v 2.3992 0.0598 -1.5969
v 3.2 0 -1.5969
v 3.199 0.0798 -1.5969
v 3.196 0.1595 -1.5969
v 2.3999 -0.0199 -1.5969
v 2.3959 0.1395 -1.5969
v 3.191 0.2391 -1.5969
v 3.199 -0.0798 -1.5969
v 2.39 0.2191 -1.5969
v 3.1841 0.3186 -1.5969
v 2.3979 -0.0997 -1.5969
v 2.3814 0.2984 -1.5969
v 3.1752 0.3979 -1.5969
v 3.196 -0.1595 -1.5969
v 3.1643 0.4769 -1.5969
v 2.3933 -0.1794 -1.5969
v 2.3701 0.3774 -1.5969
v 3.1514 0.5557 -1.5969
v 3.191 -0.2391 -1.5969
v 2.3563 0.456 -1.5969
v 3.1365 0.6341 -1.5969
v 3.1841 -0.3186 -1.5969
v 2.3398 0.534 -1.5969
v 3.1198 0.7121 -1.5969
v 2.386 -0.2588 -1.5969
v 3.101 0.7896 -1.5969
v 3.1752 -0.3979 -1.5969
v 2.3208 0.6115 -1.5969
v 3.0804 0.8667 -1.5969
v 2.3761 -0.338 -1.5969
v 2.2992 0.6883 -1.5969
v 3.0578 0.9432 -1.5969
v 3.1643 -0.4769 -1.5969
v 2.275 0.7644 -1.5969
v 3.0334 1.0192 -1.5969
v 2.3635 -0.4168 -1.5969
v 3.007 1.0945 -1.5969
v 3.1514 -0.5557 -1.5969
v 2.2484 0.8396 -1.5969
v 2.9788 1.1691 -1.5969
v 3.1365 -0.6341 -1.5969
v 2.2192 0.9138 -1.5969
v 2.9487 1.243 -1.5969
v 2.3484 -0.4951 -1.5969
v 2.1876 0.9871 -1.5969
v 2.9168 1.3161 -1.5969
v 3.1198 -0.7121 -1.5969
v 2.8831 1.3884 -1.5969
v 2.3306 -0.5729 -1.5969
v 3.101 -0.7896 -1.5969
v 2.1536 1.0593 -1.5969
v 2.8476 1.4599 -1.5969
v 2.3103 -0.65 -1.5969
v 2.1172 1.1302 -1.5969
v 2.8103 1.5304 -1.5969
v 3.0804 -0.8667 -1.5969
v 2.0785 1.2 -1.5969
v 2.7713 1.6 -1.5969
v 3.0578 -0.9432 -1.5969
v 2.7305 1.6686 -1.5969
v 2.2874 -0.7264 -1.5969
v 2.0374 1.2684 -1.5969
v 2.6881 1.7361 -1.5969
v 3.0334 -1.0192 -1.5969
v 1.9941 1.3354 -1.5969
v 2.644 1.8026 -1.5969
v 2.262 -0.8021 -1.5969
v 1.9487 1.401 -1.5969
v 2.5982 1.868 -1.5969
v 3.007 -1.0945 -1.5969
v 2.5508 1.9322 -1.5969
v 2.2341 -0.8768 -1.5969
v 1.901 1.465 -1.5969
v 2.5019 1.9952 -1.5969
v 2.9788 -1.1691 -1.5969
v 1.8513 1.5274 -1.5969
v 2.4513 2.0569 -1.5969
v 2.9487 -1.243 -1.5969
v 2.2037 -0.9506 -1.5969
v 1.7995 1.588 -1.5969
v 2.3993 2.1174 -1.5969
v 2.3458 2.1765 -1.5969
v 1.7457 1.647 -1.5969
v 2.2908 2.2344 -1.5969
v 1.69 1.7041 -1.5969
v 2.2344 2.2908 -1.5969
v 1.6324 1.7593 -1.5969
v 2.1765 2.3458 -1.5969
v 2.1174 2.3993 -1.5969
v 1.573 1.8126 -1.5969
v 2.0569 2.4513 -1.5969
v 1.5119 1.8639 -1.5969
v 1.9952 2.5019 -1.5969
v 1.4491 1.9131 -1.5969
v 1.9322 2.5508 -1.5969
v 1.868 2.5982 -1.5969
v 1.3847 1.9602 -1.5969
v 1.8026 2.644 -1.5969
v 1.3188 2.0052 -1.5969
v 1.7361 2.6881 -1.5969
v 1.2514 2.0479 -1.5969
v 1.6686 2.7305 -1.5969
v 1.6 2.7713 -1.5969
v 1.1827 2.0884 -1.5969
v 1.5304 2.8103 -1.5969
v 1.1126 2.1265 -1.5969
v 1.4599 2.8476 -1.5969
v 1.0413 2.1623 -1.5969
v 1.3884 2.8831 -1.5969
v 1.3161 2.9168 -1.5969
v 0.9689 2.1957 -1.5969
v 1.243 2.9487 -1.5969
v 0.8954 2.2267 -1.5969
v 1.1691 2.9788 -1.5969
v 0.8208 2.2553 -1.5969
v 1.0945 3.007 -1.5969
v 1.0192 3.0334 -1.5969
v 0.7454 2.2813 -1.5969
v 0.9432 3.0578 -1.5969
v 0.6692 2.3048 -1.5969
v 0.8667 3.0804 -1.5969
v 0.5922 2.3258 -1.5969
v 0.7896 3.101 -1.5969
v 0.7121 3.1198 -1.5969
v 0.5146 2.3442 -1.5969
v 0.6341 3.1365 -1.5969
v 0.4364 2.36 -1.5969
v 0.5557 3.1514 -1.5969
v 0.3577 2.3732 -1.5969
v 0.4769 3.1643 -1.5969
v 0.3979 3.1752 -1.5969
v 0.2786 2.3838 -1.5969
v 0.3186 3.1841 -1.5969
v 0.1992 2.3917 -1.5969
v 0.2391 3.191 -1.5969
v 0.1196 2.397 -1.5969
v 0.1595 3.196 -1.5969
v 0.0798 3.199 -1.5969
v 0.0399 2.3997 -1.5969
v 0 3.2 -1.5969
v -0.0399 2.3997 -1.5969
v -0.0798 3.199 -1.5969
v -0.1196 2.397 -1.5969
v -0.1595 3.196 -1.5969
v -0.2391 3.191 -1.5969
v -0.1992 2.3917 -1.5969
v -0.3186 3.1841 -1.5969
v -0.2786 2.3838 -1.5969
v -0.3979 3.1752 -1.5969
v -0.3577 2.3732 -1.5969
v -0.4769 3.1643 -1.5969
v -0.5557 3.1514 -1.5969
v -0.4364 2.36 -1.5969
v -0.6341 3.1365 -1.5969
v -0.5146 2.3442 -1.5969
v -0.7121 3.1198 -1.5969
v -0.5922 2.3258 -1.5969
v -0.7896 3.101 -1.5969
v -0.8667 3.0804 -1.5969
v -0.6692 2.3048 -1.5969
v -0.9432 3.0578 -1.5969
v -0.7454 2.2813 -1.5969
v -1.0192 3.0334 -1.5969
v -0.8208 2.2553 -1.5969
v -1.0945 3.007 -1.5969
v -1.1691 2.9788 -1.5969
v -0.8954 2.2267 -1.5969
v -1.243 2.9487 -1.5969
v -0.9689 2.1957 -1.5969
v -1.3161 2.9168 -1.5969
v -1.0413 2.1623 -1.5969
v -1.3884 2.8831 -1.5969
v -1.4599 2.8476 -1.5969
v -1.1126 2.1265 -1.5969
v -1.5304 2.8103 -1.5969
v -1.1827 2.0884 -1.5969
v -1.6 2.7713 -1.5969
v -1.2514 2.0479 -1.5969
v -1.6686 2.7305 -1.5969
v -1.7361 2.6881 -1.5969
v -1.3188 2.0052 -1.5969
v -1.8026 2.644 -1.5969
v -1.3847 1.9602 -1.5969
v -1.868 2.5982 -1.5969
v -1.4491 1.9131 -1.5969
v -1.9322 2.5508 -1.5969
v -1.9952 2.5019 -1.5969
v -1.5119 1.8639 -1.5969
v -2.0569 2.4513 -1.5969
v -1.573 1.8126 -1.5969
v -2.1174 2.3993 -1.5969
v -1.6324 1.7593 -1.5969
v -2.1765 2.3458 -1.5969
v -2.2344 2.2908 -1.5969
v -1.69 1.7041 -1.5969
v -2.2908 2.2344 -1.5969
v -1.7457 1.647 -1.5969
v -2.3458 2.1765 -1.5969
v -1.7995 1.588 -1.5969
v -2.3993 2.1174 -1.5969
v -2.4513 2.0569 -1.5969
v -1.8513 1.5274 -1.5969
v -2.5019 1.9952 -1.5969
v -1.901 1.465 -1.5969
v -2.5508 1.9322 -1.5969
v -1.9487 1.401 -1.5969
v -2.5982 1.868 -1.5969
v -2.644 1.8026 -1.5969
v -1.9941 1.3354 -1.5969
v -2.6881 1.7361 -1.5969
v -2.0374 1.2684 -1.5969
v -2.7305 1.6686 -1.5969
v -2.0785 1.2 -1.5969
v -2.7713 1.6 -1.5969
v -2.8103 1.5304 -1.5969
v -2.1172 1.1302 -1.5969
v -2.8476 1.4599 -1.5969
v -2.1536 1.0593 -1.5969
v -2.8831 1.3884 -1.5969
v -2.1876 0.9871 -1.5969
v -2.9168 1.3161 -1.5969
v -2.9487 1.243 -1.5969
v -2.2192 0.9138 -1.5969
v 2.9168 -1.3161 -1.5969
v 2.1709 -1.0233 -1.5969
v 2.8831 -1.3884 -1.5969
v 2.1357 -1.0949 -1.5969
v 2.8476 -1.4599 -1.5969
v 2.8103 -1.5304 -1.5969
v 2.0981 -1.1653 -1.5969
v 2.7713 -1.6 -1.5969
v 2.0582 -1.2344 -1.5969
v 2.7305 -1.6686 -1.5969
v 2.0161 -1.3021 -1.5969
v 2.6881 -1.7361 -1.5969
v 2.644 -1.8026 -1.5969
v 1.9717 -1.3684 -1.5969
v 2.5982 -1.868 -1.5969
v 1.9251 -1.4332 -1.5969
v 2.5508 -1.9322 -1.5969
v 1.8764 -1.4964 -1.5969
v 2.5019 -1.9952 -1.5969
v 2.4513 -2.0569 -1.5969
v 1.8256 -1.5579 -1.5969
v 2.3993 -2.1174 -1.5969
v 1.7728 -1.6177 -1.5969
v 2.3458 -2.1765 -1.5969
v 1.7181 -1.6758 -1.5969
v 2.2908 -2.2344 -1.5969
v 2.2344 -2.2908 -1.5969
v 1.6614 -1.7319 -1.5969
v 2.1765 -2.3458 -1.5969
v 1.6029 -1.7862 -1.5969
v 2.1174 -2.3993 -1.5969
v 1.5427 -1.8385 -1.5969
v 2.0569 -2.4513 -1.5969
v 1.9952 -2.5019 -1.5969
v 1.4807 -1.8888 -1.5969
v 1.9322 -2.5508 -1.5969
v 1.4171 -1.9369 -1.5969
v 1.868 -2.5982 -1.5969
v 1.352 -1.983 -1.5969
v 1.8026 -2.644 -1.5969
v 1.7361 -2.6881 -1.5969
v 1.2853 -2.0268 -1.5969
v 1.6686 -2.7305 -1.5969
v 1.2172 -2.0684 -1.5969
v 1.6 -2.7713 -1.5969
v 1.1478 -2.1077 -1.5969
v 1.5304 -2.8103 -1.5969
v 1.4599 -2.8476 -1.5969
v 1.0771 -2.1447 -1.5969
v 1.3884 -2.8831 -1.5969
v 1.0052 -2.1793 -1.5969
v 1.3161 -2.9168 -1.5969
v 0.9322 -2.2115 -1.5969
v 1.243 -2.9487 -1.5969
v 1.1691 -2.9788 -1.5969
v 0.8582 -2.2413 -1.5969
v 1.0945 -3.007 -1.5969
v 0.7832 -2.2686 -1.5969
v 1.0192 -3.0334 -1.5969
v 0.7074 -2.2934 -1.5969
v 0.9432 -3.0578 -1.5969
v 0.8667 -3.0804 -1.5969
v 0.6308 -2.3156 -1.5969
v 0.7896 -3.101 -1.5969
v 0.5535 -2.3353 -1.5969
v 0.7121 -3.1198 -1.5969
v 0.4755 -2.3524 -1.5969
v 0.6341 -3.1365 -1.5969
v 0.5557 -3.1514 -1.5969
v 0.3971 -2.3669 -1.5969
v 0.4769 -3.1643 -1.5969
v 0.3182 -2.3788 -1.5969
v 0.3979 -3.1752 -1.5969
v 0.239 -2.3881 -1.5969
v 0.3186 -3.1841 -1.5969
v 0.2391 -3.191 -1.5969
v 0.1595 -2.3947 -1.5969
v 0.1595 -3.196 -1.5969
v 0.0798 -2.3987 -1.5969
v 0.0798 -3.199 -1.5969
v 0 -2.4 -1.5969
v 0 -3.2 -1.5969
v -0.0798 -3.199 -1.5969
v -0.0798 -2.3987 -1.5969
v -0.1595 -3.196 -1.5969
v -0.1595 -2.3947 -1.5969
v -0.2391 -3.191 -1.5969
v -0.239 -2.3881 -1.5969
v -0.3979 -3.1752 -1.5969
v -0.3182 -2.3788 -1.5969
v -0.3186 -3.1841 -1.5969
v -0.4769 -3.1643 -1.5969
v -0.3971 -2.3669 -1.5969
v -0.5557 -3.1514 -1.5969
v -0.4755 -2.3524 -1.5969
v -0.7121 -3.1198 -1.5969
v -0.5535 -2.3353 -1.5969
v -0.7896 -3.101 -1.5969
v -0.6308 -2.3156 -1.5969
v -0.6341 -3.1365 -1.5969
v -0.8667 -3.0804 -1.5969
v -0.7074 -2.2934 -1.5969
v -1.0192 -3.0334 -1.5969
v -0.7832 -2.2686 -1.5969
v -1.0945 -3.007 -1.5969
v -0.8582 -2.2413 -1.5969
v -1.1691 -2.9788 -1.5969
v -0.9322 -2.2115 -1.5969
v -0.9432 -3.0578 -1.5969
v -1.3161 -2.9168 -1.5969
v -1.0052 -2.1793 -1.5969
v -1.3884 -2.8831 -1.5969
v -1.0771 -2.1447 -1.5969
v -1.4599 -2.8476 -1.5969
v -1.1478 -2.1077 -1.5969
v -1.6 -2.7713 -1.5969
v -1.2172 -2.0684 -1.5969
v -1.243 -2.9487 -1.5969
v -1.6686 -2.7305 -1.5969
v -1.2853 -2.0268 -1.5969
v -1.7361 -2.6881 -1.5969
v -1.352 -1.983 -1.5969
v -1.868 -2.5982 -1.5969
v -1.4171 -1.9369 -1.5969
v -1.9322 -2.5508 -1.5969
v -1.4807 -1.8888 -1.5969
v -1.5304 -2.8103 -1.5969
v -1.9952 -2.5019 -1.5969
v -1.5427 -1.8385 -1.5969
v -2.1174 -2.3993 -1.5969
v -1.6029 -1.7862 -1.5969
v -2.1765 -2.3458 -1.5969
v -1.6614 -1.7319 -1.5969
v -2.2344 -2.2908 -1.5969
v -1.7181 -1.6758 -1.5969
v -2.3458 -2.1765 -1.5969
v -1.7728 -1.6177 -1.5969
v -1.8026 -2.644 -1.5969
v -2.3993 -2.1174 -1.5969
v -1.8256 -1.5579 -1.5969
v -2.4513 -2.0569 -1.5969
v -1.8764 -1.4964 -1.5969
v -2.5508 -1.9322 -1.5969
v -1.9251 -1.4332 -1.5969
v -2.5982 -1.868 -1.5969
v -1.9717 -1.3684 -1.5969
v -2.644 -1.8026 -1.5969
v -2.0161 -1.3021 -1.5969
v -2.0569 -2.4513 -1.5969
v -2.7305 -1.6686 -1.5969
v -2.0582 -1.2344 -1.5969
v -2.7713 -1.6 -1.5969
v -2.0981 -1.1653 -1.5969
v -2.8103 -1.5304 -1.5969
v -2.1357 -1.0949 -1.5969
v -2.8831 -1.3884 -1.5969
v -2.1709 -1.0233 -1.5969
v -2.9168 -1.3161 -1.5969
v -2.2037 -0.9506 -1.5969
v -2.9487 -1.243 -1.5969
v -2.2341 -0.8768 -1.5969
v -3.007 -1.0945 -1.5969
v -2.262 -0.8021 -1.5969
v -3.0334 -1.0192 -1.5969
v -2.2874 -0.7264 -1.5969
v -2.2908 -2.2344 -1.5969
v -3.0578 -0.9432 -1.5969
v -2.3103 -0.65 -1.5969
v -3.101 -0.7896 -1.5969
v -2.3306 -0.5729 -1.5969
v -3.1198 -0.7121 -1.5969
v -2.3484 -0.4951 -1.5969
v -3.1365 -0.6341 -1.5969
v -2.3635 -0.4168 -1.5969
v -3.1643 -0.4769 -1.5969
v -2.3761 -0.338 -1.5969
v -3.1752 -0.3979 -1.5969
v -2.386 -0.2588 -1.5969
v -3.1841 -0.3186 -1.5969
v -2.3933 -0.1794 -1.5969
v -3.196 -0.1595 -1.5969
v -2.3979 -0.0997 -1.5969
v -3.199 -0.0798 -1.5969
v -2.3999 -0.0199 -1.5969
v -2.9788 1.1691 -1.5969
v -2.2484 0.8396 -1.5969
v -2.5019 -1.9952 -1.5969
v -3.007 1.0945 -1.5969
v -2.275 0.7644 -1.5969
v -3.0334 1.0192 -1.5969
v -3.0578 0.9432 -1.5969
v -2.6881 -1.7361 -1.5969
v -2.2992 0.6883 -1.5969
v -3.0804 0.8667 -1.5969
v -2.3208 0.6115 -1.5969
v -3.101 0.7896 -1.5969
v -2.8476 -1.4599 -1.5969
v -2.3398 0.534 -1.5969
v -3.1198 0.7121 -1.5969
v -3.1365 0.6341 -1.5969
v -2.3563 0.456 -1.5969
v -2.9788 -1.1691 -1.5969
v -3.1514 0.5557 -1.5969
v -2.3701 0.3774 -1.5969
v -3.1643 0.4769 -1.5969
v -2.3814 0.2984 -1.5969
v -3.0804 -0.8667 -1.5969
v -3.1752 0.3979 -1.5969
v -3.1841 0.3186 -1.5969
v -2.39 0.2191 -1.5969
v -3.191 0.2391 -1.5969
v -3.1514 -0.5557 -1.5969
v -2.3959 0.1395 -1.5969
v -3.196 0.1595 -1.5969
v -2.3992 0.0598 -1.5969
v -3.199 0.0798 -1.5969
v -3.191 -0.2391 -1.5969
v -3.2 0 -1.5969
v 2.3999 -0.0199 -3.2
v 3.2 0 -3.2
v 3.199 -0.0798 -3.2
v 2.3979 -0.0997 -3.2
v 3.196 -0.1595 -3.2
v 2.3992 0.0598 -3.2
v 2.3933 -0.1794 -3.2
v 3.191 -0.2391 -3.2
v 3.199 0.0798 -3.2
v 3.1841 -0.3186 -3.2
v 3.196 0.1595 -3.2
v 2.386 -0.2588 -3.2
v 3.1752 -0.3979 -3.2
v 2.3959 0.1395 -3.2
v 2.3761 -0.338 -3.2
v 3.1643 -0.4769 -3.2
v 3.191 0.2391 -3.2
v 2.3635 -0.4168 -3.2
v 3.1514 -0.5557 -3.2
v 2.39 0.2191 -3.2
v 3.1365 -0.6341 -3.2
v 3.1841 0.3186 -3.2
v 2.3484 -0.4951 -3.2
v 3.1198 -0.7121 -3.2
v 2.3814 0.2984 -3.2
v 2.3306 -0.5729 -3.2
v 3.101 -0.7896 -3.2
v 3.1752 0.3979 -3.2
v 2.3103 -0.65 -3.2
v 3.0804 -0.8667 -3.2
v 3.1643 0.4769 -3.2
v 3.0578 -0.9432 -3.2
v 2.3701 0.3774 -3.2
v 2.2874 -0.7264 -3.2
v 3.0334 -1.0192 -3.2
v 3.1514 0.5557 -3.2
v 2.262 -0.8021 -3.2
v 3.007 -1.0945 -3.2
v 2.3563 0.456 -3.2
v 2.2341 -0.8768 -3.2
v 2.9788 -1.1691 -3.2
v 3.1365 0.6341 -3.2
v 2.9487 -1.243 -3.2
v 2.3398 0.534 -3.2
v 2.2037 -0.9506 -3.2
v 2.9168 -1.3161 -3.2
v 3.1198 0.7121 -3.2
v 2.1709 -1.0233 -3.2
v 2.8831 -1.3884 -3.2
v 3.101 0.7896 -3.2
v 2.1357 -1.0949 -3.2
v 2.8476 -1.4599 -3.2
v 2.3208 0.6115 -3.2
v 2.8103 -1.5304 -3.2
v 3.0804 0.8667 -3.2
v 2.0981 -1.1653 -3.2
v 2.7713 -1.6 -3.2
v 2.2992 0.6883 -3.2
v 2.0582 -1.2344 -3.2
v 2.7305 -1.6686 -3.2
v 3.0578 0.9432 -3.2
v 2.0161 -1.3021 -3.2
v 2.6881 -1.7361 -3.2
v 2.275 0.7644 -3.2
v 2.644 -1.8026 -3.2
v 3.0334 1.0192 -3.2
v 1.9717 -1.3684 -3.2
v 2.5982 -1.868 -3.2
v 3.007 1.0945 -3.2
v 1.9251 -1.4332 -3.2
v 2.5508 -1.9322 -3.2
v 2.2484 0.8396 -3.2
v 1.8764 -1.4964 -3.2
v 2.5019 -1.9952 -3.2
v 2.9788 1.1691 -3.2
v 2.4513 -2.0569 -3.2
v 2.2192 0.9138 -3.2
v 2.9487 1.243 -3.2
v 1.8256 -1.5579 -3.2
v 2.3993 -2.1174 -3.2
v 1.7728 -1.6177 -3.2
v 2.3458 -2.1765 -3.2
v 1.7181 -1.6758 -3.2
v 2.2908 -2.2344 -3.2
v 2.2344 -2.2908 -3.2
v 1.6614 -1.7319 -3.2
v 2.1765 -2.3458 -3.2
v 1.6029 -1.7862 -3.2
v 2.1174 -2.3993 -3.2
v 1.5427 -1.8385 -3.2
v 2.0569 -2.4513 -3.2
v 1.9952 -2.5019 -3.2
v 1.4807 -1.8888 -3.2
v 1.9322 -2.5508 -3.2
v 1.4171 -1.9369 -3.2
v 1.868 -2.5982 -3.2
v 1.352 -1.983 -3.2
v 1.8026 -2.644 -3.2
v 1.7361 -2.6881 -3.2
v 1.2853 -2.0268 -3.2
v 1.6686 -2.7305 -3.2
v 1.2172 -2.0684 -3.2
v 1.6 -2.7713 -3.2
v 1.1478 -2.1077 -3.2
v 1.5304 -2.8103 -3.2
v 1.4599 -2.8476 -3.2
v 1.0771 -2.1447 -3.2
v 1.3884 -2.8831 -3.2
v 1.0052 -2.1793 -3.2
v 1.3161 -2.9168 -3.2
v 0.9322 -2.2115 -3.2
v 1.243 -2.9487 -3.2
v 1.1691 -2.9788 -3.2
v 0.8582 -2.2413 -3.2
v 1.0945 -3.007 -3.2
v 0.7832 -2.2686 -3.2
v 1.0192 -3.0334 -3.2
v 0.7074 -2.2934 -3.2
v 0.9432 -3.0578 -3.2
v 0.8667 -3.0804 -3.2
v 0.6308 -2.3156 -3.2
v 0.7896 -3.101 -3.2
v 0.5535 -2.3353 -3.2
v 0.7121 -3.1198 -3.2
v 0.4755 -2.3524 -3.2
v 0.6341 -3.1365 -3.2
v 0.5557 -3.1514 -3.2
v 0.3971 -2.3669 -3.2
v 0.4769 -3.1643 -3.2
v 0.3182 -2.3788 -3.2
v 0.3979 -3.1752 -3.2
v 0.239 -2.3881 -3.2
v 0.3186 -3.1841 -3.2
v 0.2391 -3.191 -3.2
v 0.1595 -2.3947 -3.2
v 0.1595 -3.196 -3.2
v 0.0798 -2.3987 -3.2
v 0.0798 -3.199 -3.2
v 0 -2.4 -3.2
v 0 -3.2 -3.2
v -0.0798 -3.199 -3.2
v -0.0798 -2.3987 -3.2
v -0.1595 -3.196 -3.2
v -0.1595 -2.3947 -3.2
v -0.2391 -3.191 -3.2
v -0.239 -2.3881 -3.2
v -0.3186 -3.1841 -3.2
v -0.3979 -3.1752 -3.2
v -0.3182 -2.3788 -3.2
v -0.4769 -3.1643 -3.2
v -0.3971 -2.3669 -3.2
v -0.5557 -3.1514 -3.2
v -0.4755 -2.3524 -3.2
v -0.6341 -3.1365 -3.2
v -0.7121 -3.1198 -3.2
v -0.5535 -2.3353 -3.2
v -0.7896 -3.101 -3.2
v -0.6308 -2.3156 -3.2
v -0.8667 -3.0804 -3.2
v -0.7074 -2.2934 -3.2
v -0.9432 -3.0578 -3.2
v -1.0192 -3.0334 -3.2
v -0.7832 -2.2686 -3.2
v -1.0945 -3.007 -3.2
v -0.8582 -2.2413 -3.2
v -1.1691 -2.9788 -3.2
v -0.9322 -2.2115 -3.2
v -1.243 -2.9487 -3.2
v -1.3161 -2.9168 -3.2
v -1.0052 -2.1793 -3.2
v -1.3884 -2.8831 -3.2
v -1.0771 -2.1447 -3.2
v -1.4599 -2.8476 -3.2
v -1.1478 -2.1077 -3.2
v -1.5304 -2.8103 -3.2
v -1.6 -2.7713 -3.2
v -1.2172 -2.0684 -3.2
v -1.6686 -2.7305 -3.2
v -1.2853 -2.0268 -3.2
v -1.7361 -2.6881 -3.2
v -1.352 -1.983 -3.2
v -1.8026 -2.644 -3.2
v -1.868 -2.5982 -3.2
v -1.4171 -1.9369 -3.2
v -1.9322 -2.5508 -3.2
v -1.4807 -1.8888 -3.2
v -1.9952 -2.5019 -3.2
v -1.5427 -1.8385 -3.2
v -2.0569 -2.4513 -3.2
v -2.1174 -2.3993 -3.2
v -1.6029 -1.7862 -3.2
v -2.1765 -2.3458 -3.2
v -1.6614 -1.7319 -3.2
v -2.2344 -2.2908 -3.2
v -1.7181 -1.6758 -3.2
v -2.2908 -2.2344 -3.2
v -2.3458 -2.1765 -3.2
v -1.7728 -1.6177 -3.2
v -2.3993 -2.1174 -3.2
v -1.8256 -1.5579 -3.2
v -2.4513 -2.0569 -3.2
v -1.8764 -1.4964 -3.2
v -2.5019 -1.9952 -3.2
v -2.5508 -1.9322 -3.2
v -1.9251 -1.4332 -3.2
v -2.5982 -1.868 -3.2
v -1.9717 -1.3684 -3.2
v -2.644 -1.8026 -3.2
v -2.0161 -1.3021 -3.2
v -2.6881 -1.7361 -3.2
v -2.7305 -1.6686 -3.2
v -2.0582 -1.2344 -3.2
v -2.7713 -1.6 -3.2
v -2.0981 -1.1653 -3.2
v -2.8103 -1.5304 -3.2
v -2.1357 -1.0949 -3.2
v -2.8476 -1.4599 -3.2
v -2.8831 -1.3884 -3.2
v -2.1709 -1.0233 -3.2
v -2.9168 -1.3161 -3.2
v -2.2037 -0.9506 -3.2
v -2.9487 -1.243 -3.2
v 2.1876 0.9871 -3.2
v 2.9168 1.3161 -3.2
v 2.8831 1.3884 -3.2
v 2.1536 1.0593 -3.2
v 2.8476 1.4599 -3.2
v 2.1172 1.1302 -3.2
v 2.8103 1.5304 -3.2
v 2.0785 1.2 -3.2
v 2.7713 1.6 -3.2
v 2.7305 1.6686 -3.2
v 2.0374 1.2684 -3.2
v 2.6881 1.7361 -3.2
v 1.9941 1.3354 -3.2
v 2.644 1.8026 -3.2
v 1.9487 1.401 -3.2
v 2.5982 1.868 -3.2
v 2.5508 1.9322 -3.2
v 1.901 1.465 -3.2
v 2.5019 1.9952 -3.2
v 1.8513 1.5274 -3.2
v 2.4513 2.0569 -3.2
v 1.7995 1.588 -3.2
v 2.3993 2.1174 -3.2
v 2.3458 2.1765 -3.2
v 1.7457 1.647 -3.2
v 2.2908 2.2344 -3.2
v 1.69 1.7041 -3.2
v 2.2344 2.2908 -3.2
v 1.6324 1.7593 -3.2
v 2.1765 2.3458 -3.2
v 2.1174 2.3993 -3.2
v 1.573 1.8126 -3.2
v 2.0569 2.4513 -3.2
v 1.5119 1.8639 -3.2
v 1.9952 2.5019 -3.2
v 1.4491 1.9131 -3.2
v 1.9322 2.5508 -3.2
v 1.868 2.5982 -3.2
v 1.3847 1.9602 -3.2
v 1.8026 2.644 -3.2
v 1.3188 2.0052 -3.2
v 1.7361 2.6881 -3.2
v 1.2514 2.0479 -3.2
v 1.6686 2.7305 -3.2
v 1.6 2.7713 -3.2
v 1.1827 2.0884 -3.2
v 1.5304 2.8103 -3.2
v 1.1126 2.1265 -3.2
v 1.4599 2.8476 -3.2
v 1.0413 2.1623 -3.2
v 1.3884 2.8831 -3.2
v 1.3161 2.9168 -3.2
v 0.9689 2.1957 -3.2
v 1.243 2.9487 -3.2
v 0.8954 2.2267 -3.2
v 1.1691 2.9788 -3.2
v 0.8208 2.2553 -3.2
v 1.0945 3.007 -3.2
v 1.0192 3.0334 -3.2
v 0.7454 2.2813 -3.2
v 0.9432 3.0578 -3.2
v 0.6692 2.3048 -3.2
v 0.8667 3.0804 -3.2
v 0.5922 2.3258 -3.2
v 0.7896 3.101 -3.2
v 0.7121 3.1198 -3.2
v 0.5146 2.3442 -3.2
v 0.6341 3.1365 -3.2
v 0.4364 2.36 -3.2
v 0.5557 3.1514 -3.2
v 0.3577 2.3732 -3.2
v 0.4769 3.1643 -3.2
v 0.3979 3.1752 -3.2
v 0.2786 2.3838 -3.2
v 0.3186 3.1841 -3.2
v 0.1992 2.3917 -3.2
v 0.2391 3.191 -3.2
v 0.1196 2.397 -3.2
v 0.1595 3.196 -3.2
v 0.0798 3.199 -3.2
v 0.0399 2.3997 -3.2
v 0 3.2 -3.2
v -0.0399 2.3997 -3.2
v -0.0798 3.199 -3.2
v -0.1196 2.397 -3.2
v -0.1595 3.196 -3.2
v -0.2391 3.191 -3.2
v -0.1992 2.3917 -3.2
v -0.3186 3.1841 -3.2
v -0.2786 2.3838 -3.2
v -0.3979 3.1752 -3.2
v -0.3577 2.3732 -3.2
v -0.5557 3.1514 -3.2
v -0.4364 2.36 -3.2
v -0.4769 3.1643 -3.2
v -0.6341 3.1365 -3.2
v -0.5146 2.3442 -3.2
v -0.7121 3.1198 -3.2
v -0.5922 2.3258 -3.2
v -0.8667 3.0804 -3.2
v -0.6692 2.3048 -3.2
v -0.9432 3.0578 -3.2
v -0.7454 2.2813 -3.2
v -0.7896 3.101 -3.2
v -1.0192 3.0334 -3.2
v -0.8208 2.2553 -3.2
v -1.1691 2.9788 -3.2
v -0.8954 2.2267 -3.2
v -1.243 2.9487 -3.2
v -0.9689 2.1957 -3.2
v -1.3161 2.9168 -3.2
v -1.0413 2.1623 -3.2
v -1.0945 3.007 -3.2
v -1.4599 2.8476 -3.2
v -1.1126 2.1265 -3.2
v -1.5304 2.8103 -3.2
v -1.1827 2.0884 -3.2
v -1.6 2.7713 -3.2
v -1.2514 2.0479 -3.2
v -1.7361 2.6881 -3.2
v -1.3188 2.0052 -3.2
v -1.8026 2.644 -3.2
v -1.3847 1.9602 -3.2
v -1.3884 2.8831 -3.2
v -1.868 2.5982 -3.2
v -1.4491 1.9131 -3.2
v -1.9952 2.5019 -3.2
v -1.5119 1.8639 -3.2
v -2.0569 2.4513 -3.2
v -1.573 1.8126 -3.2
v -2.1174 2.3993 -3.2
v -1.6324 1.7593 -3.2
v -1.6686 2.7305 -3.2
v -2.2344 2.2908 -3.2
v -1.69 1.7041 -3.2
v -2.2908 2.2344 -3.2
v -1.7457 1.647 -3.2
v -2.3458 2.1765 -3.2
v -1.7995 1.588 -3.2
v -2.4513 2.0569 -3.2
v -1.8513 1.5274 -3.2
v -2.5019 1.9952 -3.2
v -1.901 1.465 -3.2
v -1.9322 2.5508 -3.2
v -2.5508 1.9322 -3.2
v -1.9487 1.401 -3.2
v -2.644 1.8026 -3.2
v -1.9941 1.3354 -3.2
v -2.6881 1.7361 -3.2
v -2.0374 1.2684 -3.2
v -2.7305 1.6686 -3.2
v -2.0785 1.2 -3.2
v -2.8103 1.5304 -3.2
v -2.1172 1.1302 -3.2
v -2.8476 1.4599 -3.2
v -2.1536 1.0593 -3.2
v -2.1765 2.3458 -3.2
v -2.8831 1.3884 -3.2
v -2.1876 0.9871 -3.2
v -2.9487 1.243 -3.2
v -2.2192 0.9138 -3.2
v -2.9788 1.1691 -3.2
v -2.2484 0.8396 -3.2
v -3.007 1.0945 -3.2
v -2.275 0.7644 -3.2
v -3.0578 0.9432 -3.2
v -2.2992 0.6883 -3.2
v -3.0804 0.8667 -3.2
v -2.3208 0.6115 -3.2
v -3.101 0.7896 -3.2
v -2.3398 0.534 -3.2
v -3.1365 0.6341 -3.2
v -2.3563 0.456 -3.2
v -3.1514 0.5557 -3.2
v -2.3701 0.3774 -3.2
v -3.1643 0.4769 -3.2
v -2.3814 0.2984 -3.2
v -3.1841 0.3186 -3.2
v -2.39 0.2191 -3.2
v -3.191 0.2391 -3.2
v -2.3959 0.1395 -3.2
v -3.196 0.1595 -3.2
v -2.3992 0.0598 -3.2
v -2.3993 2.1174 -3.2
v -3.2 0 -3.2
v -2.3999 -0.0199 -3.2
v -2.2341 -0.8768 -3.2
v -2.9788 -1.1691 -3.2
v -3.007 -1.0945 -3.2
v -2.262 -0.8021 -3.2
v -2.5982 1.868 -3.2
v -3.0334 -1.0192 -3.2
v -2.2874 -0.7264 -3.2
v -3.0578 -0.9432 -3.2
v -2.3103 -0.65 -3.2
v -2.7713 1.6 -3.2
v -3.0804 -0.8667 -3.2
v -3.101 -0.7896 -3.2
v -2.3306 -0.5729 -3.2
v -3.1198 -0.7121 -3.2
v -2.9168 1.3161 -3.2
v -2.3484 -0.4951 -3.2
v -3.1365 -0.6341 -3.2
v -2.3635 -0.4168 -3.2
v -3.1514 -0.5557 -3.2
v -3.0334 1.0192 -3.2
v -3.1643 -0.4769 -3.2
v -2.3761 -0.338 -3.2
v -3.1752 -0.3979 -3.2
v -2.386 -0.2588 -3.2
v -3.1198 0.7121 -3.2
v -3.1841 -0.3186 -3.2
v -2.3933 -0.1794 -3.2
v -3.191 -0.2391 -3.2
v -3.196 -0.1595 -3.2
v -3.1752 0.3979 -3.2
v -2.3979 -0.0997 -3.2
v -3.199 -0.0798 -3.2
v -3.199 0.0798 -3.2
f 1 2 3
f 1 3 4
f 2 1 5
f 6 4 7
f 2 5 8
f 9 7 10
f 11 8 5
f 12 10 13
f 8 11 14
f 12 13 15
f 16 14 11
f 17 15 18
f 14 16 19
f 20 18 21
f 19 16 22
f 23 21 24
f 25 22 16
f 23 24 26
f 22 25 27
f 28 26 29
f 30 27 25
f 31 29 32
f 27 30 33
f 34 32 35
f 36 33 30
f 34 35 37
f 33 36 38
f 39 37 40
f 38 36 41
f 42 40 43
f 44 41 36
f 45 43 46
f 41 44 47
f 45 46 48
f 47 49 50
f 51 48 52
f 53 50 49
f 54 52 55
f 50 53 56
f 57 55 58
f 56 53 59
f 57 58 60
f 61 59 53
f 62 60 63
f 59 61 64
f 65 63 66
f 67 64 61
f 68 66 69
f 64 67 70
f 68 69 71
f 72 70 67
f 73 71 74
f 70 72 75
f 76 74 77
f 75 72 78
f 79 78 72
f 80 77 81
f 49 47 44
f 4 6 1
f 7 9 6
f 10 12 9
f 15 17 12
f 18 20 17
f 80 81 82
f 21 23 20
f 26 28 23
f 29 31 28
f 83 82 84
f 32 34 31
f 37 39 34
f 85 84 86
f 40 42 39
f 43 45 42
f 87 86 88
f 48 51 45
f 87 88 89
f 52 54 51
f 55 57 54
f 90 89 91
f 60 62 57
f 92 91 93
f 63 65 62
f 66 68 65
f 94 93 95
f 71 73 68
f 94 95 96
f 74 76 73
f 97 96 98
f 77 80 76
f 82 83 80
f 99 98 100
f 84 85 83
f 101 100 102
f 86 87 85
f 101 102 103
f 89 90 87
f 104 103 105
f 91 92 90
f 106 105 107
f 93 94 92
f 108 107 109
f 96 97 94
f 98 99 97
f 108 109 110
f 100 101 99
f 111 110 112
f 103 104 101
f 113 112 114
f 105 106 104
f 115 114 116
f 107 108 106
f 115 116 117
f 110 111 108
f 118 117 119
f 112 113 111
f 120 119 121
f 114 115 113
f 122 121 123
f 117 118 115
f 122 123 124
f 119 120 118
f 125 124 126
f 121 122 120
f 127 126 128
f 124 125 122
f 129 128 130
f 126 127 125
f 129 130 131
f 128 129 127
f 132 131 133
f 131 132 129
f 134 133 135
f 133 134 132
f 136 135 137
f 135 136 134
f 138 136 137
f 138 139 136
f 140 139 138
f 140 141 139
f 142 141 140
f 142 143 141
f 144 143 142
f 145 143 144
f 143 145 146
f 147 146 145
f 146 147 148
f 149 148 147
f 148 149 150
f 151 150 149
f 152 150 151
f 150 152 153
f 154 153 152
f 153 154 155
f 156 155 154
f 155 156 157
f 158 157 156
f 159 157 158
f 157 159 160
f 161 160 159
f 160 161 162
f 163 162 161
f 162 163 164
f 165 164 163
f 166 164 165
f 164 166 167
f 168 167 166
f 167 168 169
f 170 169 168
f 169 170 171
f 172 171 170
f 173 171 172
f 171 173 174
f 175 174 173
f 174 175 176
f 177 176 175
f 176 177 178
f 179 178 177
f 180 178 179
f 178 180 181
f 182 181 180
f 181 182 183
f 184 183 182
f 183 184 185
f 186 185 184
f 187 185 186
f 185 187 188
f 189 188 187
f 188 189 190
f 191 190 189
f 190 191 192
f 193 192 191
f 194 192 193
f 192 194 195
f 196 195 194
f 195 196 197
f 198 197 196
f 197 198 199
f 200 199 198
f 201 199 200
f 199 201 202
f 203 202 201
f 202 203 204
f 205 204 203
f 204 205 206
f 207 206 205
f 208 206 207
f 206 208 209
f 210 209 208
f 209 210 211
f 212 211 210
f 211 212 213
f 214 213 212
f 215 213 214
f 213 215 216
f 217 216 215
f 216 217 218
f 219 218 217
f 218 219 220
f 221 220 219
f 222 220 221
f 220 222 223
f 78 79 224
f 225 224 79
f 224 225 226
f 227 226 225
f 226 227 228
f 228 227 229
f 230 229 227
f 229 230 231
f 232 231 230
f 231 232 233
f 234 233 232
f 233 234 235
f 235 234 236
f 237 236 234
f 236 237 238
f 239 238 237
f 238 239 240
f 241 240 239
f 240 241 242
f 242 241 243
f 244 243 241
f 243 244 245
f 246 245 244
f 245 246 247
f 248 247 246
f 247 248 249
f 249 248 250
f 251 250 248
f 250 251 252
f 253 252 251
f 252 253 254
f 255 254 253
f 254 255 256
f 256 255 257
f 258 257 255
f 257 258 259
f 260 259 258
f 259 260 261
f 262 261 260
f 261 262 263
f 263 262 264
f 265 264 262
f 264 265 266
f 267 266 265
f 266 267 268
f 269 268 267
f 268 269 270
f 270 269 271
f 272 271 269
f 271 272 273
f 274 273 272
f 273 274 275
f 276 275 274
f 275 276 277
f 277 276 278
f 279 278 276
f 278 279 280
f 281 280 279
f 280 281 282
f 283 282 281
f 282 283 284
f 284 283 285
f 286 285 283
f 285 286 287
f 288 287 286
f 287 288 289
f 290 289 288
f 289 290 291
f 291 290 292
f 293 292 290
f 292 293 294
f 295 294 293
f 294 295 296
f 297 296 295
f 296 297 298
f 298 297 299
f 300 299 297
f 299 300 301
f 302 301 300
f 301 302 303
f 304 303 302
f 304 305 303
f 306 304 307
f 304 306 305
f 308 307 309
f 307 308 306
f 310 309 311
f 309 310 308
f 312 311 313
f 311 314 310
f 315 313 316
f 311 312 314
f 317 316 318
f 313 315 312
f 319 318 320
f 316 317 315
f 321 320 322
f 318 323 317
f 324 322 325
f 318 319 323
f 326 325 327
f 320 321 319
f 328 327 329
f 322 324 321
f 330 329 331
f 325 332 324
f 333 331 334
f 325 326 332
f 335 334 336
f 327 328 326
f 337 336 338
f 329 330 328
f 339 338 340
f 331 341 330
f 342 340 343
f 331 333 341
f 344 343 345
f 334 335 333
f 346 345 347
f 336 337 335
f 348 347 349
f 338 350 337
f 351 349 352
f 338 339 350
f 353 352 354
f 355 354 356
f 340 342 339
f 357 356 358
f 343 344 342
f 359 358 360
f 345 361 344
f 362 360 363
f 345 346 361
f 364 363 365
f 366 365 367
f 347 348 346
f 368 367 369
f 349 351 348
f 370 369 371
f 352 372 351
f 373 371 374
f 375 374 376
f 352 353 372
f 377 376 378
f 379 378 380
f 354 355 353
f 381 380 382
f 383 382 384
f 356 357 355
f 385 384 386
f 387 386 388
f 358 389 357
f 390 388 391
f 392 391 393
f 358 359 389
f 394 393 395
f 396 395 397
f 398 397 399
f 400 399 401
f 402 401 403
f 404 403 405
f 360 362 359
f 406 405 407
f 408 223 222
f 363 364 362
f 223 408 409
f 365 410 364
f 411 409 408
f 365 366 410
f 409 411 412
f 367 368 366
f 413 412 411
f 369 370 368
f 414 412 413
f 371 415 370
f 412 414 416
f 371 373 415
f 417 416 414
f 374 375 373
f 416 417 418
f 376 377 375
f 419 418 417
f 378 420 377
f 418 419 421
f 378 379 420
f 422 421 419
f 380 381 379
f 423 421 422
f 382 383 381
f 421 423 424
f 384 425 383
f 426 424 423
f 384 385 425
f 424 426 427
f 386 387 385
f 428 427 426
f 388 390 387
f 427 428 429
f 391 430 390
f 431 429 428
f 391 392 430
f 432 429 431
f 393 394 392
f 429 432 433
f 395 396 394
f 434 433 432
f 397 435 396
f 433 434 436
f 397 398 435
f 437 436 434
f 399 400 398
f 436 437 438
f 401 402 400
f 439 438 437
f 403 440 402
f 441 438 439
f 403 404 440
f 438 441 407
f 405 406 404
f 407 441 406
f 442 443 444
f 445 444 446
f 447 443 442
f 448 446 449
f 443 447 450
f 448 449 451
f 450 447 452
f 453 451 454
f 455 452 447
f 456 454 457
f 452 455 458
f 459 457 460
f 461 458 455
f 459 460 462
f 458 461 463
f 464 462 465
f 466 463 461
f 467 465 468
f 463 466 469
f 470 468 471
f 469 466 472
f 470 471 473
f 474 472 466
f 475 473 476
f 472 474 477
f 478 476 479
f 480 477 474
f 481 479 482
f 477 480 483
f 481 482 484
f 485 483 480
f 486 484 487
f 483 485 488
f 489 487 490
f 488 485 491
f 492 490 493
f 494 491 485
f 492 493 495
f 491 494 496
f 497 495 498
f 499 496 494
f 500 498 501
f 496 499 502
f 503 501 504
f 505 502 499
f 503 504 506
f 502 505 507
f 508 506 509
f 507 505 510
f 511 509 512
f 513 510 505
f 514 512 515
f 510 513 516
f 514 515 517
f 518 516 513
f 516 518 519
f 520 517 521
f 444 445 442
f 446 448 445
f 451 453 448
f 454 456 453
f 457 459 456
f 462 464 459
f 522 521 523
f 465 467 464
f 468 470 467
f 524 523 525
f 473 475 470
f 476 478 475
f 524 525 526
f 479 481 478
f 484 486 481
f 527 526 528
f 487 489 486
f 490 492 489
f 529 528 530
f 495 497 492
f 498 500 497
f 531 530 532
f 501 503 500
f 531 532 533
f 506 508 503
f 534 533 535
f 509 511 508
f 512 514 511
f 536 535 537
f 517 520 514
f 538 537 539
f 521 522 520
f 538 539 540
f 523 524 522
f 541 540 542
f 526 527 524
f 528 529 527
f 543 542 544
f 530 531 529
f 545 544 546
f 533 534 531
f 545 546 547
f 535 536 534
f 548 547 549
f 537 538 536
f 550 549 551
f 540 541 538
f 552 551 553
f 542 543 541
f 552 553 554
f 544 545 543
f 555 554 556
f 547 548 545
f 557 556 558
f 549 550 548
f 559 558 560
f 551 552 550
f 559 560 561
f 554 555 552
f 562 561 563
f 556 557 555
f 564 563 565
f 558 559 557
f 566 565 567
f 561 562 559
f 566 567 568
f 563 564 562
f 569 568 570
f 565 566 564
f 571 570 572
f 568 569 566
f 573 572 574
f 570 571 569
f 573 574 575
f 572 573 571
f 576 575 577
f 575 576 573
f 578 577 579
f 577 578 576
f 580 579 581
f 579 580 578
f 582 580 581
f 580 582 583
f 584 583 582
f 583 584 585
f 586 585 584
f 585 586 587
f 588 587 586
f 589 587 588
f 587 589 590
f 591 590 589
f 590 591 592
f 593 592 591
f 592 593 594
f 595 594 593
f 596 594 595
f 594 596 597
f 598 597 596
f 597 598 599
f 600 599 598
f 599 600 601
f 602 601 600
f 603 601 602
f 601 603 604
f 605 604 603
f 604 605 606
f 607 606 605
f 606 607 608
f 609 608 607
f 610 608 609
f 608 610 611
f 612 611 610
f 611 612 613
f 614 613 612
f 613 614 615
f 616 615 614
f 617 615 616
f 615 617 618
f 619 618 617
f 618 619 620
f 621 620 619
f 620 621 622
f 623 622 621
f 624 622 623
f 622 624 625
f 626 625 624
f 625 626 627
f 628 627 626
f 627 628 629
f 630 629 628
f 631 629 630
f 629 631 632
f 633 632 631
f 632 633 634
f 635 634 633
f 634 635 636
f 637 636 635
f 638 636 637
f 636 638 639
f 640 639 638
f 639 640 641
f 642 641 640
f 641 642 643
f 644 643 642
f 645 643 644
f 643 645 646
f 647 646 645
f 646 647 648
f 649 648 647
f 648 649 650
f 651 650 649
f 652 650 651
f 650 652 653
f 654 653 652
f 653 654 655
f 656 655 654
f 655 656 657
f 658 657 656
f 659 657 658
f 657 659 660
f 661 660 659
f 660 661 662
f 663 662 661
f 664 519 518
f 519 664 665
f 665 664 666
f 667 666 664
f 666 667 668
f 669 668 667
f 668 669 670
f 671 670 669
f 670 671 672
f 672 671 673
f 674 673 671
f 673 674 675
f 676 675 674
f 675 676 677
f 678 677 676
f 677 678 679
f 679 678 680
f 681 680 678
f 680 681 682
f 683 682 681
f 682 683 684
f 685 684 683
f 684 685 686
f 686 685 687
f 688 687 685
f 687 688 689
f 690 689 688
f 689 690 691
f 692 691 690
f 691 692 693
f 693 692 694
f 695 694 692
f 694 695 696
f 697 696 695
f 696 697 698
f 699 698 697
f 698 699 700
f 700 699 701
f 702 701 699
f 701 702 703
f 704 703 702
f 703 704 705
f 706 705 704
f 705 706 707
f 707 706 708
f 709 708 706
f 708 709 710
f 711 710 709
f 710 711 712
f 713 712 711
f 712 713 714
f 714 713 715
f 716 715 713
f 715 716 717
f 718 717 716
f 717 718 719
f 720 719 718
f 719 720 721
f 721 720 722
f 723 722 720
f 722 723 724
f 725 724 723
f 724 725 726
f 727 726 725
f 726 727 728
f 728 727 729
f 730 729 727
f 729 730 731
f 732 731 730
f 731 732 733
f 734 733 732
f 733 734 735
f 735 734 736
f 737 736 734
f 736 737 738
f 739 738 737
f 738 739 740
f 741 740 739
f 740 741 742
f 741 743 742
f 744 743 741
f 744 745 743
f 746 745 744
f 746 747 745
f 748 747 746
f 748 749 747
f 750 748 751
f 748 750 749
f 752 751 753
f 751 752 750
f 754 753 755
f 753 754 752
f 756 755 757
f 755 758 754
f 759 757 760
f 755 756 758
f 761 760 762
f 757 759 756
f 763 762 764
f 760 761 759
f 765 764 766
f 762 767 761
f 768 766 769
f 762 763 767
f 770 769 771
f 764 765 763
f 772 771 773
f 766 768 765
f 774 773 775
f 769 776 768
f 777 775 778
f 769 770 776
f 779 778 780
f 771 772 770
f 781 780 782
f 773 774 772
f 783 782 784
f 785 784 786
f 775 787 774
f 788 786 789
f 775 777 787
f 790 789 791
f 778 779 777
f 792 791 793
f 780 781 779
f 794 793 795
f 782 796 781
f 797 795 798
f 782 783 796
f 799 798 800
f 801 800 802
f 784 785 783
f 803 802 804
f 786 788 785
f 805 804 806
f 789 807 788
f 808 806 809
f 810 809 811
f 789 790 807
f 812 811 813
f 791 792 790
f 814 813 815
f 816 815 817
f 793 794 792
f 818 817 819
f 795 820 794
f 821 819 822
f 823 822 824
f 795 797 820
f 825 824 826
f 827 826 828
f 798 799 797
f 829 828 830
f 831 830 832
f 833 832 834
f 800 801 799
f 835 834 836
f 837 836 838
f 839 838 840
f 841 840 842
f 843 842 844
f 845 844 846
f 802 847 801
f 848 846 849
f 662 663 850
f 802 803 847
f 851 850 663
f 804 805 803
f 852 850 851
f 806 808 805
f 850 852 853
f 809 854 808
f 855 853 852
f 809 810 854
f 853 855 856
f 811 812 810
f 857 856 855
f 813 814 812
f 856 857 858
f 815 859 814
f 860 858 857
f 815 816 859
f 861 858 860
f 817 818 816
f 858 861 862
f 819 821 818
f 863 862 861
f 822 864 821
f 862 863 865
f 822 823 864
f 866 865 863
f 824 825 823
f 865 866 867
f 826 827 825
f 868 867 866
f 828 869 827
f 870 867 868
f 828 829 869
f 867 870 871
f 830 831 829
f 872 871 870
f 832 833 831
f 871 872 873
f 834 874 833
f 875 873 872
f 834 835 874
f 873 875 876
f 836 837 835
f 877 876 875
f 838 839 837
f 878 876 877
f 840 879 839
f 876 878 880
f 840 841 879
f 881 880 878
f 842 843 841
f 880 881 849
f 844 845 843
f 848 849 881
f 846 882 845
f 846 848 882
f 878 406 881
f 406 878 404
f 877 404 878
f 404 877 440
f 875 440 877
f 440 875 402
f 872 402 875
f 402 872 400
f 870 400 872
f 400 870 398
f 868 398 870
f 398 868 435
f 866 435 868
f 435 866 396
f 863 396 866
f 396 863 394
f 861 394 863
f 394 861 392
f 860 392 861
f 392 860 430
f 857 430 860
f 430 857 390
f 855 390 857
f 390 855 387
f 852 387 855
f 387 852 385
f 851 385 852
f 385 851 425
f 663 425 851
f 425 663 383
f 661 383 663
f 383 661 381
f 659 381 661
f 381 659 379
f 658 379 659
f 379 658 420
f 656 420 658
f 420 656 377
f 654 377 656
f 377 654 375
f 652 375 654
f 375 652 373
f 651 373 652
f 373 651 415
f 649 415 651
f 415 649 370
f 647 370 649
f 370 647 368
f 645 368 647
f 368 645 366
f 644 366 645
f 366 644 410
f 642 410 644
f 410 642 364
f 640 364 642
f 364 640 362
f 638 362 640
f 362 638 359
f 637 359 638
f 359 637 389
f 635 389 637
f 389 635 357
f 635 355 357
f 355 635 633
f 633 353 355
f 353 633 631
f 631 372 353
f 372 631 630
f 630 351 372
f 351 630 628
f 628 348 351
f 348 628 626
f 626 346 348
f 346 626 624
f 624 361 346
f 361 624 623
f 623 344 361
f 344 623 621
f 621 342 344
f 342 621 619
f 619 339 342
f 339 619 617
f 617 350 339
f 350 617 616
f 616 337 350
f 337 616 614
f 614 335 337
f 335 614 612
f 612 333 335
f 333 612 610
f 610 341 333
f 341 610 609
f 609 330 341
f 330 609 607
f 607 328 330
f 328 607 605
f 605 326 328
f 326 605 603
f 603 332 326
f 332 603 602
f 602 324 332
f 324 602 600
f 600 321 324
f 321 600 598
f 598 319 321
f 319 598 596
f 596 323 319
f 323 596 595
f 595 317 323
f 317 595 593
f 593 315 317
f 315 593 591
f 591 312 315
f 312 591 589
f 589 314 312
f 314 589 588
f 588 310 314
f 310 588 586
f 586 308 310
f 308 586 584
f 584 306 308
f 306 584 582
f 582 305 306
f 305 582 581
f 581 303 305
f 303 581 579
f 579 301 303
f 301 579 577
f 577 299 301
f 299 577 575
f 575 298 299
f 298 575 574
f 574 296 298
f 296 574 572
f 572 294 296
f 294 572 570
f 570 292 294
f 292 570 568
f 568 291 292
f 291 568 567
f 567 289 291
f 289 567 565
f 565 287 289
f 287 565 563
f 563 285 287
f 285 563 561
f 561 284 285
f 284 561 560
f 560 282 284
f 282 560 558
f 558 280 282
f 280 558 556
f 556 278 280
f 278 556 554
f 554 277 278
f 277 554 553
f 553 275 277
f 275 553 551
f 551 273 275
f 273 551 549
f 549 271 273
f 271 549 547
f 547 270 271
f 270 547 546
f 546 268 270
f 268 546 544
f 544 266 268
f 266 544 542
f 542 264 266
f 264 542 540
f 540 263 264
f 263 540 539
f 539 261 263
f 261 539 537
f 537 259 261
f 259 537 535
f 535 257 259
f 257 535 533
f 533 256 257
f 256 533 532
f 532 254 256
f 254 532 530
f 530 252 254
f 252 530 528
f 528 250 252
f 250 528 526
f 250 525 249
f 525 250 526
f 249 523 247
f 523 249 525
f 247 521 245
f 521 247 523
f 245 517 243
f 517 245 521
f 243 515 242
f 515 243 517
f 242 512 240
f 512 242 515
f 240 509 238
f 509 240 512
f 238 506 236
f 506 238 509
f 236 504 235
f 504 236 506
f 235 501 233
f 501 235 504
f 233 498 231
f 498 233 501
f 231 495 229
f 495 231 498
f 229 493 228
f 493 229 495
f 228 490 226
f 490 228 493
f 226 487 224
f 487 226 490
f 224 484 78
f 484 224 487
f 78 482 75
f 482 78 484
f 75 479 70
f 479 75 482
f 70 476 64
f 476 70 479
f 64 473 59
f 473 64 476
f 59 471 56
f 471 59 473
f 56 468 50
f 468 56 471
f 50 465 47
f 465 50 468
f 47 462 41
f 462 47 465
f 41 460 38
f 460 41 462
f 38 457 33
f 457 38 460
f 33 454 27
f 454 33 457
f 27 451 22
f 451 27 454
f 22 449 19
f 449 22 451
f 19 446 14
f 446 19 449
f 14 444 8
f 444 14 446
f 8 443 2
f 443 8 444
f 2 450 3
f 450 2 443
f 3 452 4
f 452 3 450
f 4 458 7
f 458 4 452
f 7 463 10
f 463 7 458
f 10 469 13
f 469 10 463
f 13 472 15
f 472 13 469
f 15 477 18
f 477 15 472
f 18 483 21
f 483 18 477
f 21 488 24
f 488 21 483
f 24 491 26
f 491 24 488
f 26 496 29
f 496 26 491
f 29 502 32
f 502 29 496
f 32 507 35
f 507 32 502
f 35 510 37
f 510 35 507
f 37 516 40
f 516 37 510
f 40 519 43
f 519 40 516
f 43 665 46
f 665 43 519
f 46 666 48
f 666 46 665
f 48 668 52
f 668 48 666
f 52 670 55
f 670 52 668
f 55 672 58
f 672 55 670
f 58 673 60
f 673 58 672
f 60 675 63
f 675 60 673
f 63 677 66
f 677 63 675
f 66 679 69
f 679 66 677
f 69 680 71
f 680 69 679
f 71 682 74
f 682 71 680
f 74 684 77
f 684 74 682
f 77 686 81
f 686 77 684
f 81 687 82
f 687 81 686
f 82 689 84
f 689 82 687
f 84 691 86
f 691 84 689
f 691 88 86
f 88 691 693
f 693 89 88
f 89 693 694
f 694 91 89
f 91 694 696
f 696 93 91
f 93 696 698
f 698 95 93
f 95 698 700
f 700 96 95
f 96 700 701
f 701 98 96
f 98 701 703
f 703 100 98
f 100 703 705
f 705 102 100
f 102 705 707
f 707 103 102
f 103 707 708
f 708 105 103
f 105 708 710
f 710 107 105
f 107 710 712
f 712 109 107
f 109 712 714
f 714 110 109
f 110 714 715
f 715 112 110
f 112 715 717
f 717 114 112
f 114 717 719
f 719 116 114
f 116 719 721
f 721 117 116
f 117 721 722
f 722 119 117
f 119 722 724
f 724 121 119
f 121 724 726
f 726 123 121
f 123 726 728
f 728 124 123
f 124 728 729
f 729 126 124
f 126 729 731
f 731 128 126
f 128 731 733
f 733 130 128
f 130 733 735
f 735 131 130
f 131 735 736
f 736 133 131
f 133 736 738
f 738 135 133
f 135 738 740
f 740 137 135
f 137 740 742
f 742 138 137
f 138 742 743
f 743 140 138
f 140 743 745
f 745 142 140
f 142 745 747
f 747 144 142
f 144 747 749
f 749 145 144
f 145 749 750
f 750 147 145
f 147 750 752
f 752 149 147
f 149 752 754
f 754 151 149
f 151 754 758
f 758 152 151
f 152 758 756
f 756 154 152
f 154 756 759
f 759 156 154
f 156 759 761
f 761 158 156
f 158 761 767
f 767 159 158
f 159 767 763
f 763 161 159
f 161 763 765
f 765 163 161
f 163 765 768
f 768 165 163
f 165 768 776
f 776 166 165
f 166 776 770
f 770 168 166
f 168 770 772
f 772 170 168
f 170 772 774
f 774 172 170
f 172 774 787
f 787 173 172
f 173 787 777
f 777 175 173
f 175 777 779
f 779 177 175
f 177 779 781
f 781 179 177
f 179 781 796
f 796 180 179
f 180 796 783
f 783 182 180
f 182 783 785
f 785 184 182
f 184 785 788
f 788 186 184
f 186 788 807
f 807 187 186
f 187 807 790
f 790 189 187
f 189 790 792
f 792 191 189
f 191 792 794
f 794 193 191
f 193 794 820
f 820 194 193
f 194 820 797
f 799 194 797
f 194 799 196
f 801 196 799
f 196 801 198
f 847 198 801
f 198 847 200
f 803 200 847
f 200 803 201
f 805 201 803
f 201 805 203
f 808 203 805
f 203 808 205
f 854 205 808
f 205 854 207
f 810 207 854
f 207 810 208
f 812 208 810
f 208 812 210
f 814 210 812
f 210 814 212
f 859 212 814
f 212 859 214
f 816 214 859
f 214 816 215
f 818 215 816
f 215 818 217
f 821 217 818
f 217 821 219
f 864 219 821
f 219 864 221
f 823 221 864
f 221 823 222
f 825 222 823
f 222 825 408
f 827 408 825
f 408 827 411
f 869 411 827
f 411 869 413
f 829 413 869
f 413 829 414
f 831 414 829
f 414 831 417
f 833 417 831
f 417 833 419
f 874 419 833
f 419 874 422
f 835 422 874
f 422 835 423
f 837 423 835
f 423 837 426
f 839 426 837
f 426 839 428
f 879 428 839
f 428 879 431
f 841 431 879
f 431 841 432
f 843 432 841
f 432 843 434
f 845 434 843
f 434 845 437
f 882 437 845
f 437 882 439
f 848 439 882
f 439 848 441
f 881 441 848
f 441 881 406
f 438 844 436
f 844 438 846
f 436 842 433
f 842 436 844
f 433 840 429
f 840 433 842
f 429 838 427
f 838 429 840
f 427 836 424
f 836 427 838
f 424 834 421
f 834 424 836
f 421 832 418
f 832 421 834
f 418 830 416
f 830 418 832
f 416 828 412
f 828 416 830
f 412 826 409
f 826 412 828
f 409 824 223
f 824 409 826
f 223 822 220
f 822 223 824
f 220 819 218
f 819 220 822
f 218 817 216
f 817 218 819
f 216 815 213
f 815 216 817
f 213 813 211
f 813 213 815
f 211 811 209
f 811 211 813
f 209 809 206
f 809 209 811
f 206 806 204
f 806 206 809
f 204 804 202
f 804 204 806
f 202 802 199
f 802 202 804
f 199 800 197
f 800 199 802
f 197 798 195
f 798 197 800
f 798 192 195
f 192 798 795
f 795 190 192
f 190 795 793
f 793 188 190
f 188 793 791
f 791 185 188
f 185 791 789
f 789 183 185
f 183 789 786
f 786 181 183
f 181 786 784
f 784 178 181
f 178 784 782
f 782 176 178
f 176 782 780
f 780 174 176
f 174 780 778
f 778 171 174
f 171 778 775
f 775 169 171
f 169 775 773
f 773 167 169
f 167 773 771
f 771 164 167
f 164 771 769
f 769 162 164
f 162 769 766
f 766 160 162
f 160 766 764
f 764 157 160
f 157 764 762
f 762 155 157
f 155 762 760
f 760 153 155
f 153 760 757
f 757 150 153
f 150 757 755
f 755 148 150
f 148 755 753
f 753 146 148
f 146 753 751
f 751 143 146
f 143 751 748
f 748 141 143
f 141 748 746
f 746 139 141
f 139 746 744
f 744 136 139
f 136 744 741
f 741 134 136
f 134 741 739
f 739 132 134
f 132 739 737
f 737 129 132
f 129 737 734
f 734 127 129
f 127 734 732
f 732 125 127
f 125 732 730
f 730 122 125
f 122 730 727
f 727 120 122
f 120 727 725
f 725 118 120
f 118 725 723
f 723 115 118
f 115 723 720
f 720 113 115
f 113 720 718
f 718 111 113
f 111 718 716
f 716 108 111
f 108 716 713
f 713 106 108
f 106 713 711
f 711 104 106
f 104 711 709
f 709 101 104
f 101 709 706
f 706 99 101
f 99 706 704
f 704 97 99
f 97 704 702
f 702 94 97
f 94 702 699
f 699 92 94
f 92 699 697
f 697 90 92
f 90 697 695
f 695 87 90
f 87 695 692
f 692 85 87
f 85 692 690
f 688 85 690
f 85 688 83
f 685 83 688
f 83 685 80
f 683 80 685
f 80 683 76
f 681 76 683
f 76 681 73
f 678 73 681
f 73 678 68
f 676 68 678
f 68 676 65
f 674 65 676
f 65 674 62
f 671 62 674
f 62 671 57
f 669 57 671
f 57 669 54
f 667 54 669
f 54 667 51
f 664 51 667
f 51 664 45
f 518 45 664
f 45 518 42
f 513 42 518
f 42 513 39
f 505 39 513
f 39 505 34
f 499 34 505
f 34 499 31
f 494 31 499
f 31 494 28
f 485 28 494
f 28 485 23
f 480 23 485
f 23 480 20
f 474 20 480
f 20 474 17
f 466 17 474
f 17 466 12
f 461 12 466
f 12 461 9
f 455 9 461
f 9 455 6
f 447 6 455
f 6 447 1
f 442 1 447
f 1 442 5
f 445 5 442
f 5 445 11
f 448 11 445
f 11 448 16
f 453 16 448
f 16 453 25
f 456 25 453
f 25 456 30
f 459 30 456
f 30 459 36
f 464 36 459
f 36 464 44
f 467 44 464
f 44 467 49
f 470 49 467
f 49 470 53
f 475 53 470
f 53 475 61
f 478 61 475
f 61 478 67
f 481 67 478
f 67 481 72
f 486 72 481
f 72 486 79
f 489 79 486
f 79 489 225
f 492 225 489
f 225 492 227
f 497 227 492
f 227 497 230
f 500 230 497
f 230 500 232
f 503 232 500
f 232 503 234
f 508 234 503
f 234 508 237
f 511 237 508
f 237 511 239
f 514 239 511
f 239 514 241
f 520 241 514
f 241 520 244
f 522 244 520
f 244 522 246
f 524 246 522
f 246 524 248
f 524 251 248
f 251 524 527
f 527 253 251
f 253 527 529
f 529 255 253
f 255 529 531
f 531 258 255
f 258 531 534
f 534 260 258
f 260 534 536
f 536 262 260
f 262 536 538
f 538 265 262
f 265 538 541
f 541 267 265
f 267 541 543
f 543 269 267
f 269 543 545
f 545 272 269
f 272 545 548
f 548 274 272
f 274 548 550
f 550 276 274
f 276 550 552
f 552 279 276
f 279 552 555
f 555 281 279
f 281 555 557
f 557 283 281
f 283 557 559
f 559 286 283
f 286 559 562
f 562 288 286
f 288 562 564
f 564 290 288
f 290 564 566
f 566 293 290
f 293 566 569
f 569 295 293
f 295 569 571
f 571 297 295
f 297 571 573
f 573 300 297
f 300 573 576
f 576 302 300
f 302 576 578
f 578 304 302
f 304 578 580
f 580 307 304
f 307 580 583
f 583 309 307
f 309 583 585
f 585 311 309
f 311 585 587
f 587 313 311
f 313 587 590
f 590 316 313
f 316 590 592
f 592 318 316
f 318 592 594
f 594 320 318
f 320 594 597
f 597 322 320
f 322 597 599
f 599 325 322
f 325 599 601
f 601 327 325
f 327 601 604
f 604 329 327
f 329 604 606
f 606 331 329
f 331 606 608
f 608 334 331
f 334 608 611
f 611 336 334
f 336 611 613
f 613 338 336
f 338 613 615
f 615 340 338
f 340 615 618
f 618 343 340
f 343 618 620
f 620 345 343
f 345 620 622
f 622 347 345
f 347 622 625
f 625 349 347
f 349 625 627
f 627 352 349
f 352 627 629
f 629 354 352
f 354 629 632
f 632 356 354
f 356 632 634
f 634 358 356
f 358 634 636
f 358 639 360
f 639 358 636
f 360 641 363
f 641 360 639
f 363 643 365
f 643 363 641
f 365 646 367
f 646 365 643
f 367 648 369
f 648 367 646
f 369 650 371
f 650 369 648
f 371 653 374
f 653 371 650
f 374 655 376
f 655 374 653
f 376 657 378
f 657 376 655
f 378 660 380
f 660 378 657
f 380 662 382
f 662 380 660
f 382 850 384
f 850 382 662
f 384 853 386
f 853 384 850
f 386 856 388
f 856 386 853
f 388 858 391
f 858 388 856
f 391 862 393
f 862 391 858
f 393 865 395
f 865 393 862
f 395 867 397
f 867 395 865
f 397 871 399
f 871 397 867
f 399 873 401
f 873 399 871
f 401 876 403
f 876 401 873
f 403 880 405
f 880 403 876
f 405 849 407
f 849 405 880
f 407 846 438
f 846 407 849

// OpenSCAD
use <../lib.scad>
use <3068bp68.scad>
$fa=1; $fs=0.2;
function ldraw_lib__3068p68(realsolid=false) = [
// 0 ~Moved to 3068bp68
// 0 Name: 3068p68.dat
// 0 Author: [PTadmin]
// 0 !LDRAW_ORG Part UPDATE 2004-02
// 0 !LICENSE Licensed under CC BY 4.0 : see CAreadme.txt
// 
// 0 BFC CERTIFY CCW
  [0,"BFC","CERTIFY"],
  [0,"BFC","CCW"],
// 
// 0 !HISTORY 1998-09-15 [PTadmin] Official Update 1998-08
// 0 !HISTORY 2004-04-22 [PTadmin] Official Update 2004-02
// 0 !HISTORY 2007-06-13 [PTadmin] Header formatted for Contributor Agreement
// 0 !HISTORY 2008-07-01 [PTadmin] Official Update 2008-01
// 
// 
// 1 16 0 0 0 1 0 0 0 1 0 0 0 1 3068bp68.dat
  [1,16,0,0,0,1,0,0,0,1,0,0,0,1, ldraw_lib__3068bp68(realsolid)],
];
module ldraw_lib__3068p68(step=0, col=false, unit=2/5, alt=false, line=0.2, solid=!$preview)
    makepoly(ldraw_lib__3068p68(solid), step=step, col=col, unit=unit, alt=alt, line=line, solid=solid);
ldraw_lib__3068p68(line=0.2);
